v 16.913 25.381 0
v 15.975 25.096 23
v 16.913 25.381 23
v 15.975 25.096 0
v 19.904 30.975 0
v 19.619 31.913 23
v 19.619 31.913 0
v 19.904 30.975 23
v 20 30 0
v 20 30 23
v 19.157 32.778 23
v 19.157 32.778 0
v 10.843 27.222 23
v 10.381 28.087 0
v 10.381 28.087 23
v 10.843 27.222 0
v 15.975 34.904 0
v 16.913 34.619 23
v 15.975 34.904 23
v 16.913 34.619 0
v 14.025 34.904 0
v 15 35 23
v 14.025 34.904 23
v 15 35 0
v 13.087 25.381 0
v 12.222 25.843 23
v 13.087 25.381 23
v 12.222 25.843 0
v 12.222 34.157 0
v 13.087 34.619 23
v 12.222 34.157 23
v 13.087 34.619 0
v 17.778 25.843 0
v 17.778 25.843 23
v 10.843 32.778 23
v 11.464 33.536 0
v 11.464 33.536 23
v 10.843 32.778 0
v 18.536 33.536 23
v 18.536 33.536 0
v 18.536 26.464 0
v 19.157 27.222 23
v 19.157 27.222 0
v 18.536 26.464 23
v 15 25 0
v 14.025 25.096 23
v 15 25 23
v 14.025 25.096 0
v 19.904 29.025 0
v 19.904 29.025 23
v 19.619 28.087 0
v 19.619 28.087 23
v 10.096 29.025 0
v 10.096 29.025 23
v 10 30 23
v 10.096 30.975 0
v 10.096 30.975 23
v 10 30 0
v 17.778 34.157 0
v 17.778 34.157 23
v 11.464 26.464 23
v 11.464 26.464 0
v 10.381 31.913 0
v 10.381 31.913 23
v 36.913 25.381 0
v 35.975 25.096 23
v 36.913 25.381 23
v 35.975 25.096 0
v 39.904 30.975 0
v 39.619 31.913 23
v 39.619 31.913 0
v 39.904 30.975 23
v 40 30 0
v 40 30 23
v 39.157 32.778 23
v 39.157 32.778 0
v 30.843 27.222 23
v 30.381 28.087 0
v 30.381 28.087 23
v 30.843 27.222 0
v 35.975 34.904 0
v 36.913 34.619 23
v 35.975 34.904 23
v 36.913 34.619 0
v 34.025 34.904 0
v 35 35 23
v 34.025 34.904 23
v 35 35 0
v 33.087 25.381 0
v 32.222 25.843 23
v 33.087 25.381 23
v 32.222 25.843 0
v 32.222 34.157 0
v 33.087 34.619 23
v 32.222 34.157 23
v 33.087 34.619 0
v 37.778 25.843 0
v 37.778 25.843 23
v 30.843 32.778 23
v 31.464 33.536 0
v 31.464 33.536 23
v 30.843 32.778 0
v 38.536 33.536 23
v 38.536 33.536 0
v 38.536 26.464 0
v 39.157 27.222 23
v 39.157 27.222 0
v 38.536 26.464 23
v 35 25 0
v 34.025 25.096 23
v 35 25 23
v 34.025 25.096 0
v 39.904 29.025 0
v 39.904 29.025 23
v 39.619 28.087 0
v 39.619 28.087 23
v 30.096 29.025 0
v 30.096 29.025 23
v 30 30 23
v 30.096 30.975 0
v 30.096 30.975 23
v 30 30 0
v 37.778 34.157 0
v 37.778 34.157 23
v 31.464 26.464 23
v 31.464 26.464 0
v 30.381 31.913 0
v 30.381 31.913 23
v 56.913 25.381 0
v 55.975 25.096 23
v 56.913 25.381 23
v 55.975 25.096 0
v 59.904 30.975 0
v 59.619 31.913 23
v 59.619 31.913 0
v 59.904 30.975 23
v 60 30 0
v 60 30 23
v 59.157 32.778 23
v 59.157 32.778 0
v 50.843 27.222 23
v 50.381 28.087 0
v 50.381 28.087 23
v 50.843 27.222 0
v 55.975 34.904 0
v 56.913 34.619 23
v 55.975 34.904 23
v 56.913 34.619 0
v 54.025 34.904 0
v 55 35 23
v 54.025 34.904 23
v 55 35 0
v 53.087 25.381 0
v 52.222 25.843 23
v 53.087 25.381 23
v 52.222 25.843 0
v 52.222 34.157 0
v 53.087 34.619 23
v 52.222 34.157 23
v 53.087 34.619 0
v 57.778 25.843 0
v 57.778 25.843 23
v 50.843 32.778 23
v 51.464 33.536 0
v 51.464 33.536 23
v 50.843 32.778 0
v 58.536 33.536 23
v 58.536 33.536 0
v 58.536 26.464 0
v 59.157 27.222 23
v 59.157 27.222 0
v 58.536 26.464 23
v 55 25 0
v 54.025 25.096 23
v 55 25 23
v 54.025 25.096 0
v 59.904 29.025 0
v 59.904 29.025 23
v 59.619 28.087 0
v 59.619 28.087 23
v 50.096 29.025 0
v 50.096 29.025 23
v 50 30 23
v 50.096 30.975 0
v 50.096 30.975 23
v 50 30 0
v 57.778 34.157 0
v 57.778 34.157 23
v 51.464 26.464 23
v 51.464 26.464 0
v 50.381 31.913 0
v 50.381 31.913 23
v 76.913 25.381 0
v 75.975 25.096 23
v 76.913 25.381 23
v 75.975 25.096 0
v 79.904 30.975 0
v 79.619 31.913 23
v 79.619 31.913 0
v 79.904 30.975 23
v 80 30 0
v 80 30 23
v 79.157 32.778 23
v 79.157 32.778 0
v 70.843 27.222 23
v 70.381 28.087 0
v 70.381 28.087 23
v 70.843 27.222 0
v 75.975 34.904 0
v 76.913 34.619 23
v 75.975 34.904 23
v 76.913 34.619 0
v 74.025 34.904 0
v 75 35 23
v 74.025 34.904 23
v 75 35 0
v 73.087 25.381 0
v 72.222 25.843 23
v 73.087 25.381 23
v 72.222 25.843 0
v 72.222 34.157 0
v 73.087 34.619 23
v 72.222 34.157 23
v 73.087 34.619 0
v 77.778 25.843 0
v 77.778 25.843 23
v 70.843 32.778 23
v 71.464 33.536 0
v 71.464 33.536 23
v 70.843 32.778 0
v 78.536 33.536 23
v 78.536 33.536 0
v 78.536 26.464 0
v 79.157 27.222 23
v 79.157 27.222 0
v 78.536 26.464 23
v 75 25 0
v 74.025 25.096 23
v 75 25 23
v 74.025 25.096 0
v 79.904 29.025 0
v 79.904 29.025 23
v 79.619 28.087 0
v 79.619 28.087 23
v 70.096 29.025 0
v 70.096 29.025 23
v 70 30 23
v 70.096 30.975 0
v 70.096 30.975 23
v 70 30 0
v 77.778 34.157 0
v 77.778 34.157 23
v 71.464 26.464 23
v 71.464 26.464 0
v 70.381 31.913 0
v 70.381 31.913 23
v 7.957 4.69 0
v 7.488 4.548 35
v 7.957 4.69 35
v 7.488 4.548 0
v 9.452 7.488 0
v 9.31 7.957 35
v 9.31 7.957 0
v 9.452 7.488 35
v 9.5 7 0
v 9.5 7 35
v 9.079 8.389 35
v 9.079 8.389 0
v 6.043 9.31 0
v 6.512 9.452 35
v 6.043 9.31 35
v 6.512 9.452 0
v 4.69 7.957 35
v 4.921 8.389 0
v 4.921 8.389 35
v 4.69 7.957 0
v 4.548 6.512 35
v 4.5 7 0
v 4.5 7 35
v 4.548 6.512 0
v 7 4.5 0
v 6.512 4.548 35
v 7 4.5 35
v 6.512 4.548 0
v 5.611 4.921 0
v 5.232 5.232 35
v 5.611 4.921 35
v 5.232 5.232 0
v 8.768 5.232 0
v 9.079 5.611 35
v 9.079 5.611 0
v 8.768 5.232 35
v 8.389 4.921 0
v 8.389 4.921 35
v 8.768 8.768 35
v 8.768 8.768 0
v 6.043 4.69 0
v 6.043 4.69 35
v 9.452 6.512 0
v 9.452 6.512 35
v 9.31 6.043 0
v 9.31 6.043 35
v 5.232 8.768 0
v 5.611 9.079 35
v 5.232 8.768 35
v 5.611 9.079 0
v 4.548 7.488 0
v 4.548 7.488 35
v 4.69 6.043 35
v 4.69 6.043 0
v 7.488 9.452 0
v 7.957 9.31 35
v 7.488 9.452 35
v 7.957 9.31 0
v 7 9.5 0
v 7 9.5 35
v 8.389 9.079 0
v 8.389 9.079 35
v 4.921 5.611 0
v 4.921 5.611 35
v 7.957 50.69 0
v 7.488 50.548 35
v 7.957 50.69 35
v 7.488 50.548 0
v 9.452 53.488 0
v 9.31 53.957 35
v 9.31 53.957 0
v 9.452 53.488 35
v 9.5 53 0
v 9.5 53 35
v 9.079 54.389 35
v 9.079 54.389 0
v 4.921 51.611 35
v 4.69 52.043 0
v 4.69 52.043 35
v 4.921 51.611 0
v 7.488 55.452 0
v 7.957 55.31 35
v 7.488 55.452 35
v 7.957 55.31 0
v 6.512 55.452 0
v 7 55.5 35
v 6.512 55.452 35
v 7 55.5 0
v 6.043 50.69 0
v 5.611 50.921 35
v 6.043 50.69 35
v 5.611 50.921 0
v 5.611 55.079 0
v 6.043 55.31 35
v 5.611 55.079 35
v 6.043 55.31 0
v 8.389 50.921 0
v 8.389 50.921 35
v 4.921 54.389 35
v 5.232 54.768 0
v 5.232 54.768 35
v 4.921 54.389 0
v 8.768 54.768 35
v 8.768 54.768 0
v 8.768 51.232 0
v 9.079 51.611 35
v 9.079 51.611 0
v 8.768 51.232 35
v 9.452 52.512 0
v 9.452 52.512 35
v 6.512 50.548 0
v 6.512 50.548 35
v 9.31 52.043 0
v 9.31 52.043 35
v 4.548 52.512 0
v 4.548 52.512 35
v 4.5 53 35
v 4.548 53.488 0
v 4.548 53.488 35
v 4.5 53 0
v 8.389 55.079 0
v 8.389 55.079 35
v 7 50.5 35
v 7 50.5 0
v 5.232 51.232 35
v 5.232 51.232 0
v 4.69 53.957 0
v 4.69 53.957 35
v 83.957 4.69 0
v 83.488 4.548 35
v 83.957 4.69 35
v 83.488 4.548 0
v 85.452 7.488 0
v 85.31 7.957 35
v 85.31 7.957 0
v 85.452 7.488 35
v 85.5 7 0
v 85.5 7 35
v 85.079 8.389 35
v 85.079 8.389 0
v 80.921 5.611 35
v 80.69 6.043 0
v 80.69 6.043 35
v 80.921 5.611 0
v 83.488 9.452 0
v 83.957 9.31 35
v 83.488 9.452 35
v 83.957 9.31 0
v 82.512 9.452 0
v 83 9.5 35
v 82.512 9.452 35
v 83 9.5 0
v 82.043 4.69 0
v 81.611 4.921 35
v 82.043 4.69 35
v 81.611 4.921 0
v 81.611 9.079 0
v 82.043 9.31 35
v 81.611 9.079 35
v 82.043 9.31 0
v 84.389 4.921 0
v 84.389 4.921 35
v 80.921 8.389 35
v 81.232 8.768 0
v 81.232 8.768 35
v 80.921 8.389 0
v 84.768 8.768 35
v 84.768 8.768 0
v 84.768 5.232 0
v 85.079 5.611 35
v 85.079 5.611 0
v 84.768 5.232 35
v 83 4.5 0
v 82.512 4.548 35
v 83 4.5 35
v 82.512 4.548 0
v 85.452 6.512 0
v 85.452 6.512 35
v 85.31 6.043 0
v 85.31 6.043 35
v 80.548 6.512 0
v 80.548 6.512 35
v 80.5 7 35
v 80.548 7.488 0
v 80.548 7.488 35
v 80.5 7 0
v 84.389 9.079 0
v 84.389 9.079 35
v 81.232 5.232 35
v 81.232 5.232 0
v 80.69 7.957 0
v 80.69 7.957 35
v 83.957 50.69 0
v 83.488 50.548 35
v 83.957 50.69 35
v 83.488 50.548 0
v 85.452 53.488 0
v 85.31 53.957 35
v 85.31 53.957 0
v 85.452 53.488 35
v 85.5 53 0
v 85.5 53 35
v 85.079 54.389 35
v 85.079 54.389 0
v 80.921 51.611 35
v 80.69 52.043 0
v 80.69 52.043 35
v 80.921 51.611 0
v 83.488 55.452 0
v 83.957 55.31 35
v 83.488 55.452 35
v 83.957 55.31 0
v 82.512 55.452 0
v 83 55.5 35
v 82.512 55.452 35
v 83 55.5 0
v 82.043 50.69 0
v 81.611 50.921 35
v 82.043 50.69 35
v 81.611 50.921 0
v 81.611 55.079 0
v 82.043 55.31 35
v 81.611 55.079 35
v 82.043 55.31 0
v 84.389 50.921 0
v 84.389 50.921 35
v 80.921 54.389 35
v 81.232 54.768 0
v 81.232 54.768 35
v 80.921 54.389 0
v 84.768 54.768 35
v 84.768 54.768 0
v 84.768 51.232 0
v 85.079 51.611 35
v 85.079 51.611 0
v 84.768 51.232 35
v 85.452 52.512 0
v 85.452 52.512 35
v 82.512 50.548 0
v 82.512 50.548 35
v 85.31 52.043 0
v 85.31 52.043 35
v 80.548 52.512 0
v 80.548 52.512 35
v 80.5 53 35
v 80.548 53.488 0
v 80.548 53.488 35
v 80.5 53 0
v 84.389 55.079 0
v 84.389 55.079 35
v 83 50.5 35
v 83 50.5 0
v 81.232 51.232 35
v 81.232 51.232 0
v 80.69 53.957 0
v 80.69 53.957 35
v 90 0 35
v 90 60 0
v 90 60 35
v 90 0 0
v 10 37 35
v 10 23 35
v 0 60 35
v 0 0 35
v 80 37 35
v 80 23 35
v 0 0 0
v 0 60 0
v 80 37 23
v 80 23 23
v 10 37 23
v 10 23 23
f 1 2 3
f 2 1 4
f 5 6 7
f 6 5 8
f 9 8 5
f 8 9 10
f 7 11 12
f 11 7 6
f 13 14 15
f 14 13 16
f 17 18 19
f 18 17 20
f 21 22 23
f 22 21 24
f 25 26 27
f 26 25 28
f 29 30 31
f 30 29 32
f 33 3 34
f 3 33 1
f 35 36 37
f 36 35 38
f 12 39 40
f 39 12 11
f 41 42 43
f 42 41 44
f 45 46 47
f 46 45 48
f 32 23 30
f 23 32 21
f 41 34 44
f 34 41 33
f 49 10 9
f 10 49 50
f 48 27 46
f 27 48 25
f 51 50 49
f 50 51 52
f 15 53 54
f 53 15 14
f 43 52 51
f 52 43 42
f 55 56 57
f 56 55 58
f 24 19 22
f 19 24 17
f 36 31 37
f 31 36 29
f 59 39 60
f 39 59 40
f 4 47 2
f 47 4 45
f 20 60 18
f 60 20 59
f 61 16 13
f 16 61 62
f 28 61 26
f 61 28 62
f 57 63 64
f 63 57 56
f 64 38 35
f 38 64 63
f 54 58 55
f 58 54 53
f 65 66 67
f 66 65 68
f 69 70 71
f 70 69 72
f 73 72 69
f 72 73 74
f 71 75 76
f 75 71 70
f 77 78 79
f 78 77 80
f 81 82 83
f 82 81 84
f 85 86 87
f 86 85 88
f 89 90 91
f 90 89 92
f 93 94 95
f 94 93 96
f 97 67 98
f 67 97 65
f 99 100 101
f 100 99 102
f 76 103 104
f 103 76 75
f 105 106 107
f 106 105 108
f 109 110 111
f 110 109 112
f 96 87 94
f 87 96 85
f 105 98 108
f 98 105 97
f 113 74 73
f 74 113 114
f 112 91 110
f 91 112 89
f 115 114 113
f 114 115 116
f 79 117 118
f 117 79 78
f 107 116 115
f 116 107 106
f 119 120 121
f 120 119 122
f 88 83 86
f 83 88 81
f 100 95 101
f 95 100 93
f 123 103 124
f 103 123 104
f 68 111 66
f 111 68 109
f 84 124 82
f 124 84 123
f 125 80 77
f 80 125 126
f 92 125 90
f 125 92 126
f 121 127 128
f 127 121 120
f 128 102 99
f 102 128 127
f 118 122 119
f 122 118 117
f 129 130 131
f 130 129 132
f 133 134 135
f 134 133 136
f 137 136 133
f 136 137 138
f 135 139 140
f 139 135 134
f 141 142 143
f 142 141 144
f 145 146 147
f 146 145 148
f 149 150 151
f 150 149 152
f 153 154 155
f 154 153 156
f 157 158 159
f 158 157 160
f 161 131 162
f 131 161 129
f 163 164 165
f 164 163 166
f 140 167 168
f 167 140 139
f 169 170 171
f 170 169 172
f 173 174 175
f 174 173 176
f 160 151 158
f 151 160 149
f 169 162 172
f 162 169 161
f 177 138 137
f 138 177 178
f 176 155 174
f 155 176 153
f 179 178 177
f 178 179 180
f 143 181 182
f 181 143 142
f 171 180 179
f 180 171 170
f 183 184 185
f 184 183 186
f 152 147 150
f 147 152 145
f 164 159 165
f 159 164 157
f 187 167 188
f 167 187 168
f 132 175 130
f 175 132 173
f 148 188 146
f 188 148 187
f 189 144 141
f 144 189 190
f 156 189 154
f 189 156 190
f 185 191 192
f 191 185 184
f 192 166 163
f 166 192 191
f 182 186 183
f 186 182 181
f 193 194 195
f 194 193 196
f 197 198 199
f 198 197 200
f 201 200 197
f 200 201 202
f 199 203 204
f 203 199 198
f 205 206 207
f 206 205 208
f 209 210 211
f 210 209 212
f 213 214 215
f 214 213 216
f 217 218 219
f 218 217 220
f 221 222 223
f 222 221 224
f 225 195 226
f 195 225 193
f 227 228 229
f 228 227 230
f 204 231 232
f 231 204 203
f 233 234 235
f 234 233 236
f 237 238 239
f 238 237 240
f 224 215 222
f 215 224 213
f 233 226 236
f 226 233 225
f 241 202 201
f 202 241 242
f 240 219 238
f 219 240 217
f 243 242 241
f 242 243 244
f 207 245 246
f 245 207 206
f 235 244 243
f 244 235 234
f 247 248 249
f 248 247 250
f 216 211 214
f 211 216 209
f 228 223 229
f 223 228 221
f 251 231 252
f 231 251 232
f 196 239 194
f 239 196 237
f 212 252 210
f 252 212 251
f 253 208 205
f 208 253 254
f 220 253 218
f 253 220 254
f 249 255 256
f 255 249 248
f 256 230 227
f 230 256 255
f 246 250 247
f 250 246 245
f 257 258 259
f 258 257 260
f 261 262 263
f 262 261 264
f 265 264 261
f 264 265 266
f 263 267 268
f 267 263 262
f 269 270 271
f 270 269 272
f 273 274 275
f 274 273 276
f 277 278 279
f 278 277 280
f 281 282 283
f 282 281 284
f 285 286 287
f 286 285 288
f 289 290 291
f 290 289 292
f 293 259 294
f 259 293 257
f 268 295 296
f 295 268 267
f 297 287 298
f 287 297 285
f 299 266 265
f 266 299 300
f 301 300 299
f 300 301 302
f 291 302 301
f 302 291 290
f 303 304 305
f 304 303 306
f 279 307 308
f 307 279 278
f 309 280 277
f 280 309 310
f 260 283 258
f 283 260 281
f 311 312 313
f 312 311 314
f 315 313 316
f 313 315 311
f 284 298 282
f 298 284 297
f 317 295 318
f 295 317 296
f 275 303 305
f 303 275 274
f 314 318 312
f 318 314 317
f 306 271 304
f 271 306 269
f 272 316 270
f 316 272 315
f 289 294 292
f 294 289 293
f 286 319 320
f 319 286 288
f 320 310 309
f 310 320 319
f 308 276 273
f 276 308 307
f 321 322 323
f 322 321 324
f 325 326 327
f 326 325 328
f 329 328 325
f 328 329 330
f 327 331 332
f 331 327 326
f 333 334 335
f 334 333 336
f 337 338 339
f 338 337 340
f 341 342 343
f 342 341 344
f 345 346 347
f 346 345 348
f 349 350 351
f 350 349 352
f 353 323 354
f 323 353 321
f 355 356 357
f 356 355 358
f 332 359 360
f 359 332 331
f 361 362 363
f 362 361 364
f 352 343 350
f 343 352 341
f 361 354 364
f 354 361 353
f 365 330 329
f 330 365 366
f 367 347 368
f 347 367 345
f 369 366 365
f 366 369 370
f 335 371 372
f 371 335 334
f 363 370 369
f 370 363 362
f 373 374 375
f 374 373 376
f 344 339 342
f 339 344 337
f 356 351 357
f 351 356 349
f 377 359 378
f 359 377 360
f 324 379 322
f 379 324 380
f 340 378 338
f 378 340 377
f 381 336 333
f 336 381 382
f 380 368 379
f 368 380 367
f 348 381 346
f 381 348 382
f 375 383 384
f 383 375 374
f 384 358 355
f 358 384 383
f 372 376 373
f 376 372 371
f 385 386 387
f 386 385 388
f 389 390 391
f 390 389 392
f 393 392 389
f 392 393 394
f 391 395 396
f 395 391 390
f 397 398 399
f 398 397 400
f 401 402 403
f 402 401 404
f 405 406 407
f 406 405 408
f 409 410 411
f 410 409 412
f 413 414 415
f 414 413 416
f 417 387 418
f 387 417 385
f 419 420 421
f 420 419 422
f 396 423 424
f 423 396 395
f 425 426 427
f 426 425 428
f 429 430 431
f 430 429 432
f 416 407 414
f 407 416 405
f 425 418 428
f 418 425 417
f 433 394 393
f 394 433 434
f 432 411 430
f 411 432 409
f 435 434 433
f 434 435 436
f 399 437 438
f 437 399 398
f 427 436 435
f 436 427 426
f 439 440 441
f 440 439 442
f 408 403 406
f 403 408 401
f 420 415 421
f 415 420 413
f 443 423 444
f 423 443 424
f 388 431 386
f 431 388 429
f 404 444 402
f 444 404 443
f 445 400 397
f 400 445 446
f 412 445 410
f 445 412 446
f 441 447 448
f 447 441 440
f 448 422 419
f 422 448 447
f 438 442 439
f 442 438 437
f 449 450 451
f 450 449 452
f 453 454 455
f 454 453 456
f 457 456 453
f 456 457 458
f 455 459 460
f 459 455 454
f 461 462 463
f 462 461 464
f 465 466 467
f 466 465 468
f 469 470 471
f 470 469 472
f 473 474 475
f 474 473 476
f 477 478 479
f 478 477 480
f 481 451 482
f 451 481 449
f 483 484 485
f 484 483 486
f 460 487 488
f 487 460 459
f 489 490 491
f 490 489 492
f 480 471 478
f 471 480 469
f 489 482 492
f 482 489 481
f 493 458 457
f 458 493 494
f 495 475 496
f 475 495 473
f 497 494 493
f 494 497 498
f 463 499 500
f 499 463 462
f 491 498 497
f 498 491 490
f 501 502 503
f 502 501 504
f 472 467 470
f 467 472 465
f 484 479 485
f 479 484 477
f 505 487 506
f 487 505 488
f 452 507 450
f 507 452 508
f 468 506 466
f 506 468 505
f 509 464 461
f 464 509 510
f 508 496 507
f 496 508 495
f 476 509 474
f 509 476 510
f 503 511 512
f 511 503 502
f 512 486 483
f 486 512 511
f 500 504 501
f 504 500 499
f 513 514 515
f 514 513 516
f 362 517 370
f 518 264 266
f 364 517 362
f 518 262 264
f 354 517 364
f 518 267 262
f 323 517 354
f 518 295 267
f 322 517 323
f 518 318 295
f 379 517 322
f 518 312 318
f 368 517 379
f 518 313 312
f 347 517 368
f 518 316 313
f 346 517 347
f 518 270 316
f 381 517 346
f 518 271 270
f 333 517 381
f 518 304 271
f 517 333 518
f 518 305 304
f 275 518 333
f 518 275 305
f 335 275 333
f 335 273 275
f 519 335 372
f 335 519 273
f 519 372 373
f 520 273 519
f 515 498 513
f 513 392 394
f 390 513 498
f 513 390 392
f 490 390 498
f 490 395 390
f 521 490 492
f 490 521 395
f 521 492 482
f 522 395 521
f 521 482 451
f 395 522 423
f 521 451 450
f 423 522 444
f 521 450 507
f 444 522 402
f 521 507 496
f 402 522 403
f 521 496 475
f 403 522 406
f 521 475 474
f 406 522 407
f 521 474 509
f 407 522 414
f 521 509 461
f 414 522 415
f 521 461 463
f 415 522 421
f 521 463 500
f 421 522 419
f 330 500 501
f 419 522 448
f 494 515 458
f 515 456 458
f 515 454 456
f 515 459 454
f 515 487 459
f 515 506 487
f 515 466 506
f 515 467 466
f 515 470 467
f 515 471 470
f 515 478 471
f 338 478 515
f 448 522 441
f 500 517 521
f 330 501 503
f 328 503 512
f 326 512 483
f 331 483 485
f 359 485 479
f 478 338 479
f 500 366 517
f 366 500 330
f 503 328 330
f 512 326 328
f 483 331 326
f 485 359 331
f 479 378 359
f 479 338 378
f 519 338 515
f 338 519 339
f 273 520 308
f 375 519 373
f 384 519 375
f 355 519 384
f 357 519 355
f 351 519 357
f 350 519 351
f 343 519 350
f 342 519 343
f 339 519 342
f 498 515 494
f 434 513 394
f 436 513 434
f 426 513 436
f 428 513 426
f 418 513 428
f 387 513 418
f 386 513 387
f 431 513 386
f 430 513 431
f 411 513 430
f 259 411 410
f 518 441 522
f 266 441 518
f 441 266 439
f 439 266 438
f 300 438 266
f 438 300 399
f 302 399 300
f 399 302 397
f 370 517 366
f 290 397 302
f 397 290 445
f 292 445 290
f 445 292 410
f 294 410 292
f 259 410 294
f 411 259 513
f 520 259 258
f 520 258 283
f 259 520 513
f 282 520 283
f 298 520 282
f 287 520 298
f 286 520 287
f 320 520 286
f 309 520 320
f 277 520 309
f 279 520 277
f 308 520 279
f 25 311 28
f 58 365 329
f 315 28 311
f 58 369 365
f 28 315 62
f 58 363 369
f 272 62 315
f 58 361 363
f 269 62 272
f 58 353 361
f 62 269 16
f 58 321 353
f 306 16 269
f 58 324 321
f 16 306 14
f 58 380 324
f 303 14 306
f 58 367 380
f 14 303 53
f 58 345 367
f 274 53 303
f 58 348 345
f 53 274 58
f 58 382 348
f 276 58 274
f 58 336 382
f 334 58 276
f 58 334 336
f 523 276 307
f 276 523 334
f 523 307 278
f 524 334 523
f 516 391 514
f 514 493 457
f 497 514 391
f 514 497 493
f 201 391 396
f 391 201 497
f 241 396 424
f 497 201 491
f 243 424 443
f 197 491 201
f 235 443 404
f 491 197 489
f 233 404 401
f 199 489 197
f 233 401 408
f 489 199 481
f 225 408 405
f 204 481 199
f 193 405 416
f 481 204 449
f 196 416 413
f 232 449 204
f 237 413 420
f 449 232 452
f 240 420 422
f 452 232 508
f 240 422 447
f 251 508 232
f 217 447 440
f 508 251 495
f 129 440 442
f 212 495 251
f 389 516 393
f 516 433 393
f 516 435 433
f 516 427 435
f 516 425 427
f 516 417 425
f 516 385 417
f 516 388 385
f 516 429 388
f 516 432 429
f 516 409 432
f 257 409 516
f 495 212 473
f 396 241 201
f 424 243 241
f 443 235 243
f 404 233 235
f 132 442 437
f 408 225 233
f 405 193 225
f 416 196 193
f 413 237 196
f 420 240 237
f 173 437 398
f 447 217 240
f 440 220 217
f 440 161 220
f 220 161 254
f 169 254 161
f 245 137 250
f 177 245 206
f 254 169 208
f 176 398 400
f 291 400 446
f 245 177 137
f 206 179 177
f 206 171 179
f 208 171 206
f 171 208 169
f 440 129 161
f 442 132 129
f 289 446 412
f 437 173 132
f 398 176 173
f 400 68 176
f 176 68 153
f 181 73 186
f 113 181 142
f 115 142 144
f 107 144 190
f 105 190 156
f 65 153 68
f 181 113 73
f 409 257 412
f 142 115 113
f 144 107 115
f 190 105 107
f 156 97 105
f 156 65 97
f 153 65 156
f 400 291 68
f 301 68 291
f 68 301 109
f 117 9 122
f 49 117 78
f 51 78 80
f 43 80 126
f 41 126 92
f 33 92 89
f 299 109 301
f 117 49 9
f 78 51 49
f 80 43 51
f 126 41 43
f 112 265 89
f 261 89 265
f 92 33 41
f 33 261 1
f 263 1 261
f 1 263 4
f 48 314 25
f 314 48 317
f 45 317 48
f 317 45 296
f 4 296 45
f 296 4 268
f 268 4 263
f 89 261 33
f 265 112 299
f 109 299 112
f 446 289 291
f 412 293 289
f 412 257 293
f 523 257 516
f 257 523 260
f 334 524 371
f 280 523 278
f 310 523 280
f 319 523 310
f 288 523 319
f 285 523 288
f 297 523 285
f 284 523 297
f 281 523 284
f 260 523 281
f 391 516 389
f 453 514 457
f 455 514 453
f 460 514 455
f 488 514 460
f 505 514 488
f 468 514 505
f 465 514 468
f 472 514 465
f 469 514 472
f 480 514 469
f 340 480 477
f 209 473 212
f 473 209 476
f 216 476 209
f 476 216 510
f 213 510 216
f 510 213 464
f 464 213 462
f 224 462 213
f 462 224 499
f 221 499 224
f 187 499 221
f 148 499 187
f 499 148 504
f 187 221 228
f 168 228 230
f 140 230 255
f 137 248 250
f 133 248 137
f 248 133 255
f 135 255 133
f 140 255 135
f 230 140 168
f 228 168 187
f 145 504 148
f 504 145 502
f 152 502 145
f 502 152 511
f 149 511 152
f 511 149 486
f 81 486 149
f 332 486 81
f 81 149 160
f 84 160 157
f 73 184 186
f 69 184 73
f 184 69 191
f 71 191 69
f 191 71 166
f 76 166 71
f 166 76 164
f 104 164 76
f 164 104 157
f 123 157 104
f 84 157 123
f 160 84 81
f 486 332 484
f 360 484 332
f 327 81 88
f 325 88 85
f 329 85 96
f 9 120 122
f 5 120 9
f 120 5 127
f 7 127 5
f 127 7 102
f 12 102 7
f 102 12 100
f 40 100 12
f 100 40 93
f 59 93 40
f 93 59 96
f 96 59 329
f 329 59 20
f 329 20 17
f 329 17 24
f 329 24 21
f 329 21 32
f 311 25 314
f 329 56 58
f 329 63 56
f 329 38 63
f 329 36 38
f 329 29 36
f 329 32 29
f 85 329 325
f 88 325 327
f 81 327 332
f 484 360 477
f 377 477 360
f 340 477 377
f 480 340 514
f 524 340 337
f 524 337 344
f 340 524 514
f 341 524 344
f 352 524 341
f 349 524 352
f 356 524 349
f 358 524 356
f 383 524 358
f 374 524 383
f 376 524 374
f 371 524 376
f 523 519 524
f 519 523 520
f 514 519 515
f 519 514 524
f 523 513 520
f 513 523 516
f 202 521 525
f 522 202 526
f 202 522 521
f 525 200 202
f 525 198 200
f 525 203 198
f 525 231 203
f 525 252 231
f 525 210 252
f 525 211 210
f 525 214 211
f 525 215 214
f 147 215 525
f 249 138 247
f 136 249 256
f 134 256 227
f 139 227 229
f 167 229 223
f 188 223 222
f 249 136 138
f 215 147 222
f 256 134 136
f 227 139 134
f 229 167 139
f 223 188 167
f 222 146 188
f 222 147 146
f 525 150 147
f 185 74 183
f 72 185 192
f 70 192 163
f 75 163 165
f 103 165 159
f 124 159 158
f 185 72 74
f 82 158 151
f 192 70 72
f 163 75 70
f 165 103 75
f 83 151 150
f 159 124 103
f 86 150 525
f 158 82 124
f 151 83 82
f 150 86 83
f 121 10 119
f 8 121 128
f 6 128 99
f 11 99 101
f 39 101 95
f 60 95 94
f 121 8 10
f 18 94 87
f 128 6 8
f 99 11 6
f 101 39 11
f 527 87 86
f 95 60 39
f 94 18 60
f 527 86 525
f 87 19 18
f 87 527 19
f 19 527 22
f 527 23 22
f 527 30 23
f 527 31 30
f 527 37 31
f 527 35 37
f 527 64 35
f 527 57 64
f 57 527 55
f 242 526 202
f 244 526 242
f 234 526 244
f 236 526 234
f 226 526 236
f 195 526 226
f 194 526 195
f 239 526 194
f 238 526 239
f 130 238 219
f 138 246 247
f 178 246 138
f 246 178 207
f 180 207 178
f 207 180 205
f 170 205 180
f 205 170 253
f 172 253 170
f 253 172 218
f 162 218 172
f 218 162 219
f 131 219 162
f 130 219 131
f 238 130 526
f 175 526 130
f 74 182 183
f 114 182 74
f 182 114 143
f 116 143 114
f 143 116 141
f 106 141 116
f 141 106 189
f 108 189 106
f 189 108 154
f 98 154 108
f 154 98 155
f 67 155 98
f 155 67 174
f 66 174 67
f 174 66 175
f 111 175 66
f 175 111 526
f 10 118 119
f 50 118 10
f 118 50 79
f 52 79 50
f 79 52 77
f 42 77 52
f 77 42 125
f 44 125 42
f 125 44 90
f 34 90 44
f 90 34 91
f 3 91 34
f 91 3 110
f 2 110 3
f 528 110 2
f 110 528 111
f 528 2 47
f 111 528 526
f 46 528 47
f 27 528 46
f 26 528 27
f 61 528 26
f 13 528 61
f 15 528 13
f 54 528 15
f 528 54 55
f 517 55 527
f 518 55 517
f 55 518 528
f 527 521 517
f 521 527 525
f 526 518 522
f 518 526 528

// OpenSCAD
$fn = 32;

// ----------------------------------------------------------------------
// Manifold block: gallery_top manifold
// ----------------------------------------------------------------------

// --- parameters (mm) ---
block_l = 90;             // block length, X
block_w = 60;             // block width, Y
block_h = 35;             // block height, Z
port_d = 10;              // port bore diameter
port_pitch = 20;          // port pitch along X
gallery_d = 14;           // top gallery width, Y
gallery_depth = 12;       // gallery pocket depth
wall_p = 10;              // gallery end wall thickness, X
mnt_d = 5;                // mounting hole diameter
mnt_in = 7;               // mounting hole inset from the edges

n_ports = 4;  // ports in the row
port_x0 = (block_l - (n_ports - 1) * port_pitch) / 2;  // first port X

difference() {
  cube([block_l, block_w, block_h]);
  for (i = [0 : n_ports - 1])
    translate([port_x0 + i * port_pitch, block_w / 2, -1])
      cylinder(h = block_h + 2, d = port_d);
  translate([wall_p, block_w / 2 - gallery_d / 2, block_h - gallery_depth])
    cube([block_l - 2 * wall_p, gallery_d, gallery_depth + 1]);
  for (cx = [mnt_in, block_l - mnt_in])
    for (cy = [mnt_in, block_w - mnt_in])
      translate([cx, cy, -1]) cylinder(h = block_h + 2, d = mnt_d);
}
